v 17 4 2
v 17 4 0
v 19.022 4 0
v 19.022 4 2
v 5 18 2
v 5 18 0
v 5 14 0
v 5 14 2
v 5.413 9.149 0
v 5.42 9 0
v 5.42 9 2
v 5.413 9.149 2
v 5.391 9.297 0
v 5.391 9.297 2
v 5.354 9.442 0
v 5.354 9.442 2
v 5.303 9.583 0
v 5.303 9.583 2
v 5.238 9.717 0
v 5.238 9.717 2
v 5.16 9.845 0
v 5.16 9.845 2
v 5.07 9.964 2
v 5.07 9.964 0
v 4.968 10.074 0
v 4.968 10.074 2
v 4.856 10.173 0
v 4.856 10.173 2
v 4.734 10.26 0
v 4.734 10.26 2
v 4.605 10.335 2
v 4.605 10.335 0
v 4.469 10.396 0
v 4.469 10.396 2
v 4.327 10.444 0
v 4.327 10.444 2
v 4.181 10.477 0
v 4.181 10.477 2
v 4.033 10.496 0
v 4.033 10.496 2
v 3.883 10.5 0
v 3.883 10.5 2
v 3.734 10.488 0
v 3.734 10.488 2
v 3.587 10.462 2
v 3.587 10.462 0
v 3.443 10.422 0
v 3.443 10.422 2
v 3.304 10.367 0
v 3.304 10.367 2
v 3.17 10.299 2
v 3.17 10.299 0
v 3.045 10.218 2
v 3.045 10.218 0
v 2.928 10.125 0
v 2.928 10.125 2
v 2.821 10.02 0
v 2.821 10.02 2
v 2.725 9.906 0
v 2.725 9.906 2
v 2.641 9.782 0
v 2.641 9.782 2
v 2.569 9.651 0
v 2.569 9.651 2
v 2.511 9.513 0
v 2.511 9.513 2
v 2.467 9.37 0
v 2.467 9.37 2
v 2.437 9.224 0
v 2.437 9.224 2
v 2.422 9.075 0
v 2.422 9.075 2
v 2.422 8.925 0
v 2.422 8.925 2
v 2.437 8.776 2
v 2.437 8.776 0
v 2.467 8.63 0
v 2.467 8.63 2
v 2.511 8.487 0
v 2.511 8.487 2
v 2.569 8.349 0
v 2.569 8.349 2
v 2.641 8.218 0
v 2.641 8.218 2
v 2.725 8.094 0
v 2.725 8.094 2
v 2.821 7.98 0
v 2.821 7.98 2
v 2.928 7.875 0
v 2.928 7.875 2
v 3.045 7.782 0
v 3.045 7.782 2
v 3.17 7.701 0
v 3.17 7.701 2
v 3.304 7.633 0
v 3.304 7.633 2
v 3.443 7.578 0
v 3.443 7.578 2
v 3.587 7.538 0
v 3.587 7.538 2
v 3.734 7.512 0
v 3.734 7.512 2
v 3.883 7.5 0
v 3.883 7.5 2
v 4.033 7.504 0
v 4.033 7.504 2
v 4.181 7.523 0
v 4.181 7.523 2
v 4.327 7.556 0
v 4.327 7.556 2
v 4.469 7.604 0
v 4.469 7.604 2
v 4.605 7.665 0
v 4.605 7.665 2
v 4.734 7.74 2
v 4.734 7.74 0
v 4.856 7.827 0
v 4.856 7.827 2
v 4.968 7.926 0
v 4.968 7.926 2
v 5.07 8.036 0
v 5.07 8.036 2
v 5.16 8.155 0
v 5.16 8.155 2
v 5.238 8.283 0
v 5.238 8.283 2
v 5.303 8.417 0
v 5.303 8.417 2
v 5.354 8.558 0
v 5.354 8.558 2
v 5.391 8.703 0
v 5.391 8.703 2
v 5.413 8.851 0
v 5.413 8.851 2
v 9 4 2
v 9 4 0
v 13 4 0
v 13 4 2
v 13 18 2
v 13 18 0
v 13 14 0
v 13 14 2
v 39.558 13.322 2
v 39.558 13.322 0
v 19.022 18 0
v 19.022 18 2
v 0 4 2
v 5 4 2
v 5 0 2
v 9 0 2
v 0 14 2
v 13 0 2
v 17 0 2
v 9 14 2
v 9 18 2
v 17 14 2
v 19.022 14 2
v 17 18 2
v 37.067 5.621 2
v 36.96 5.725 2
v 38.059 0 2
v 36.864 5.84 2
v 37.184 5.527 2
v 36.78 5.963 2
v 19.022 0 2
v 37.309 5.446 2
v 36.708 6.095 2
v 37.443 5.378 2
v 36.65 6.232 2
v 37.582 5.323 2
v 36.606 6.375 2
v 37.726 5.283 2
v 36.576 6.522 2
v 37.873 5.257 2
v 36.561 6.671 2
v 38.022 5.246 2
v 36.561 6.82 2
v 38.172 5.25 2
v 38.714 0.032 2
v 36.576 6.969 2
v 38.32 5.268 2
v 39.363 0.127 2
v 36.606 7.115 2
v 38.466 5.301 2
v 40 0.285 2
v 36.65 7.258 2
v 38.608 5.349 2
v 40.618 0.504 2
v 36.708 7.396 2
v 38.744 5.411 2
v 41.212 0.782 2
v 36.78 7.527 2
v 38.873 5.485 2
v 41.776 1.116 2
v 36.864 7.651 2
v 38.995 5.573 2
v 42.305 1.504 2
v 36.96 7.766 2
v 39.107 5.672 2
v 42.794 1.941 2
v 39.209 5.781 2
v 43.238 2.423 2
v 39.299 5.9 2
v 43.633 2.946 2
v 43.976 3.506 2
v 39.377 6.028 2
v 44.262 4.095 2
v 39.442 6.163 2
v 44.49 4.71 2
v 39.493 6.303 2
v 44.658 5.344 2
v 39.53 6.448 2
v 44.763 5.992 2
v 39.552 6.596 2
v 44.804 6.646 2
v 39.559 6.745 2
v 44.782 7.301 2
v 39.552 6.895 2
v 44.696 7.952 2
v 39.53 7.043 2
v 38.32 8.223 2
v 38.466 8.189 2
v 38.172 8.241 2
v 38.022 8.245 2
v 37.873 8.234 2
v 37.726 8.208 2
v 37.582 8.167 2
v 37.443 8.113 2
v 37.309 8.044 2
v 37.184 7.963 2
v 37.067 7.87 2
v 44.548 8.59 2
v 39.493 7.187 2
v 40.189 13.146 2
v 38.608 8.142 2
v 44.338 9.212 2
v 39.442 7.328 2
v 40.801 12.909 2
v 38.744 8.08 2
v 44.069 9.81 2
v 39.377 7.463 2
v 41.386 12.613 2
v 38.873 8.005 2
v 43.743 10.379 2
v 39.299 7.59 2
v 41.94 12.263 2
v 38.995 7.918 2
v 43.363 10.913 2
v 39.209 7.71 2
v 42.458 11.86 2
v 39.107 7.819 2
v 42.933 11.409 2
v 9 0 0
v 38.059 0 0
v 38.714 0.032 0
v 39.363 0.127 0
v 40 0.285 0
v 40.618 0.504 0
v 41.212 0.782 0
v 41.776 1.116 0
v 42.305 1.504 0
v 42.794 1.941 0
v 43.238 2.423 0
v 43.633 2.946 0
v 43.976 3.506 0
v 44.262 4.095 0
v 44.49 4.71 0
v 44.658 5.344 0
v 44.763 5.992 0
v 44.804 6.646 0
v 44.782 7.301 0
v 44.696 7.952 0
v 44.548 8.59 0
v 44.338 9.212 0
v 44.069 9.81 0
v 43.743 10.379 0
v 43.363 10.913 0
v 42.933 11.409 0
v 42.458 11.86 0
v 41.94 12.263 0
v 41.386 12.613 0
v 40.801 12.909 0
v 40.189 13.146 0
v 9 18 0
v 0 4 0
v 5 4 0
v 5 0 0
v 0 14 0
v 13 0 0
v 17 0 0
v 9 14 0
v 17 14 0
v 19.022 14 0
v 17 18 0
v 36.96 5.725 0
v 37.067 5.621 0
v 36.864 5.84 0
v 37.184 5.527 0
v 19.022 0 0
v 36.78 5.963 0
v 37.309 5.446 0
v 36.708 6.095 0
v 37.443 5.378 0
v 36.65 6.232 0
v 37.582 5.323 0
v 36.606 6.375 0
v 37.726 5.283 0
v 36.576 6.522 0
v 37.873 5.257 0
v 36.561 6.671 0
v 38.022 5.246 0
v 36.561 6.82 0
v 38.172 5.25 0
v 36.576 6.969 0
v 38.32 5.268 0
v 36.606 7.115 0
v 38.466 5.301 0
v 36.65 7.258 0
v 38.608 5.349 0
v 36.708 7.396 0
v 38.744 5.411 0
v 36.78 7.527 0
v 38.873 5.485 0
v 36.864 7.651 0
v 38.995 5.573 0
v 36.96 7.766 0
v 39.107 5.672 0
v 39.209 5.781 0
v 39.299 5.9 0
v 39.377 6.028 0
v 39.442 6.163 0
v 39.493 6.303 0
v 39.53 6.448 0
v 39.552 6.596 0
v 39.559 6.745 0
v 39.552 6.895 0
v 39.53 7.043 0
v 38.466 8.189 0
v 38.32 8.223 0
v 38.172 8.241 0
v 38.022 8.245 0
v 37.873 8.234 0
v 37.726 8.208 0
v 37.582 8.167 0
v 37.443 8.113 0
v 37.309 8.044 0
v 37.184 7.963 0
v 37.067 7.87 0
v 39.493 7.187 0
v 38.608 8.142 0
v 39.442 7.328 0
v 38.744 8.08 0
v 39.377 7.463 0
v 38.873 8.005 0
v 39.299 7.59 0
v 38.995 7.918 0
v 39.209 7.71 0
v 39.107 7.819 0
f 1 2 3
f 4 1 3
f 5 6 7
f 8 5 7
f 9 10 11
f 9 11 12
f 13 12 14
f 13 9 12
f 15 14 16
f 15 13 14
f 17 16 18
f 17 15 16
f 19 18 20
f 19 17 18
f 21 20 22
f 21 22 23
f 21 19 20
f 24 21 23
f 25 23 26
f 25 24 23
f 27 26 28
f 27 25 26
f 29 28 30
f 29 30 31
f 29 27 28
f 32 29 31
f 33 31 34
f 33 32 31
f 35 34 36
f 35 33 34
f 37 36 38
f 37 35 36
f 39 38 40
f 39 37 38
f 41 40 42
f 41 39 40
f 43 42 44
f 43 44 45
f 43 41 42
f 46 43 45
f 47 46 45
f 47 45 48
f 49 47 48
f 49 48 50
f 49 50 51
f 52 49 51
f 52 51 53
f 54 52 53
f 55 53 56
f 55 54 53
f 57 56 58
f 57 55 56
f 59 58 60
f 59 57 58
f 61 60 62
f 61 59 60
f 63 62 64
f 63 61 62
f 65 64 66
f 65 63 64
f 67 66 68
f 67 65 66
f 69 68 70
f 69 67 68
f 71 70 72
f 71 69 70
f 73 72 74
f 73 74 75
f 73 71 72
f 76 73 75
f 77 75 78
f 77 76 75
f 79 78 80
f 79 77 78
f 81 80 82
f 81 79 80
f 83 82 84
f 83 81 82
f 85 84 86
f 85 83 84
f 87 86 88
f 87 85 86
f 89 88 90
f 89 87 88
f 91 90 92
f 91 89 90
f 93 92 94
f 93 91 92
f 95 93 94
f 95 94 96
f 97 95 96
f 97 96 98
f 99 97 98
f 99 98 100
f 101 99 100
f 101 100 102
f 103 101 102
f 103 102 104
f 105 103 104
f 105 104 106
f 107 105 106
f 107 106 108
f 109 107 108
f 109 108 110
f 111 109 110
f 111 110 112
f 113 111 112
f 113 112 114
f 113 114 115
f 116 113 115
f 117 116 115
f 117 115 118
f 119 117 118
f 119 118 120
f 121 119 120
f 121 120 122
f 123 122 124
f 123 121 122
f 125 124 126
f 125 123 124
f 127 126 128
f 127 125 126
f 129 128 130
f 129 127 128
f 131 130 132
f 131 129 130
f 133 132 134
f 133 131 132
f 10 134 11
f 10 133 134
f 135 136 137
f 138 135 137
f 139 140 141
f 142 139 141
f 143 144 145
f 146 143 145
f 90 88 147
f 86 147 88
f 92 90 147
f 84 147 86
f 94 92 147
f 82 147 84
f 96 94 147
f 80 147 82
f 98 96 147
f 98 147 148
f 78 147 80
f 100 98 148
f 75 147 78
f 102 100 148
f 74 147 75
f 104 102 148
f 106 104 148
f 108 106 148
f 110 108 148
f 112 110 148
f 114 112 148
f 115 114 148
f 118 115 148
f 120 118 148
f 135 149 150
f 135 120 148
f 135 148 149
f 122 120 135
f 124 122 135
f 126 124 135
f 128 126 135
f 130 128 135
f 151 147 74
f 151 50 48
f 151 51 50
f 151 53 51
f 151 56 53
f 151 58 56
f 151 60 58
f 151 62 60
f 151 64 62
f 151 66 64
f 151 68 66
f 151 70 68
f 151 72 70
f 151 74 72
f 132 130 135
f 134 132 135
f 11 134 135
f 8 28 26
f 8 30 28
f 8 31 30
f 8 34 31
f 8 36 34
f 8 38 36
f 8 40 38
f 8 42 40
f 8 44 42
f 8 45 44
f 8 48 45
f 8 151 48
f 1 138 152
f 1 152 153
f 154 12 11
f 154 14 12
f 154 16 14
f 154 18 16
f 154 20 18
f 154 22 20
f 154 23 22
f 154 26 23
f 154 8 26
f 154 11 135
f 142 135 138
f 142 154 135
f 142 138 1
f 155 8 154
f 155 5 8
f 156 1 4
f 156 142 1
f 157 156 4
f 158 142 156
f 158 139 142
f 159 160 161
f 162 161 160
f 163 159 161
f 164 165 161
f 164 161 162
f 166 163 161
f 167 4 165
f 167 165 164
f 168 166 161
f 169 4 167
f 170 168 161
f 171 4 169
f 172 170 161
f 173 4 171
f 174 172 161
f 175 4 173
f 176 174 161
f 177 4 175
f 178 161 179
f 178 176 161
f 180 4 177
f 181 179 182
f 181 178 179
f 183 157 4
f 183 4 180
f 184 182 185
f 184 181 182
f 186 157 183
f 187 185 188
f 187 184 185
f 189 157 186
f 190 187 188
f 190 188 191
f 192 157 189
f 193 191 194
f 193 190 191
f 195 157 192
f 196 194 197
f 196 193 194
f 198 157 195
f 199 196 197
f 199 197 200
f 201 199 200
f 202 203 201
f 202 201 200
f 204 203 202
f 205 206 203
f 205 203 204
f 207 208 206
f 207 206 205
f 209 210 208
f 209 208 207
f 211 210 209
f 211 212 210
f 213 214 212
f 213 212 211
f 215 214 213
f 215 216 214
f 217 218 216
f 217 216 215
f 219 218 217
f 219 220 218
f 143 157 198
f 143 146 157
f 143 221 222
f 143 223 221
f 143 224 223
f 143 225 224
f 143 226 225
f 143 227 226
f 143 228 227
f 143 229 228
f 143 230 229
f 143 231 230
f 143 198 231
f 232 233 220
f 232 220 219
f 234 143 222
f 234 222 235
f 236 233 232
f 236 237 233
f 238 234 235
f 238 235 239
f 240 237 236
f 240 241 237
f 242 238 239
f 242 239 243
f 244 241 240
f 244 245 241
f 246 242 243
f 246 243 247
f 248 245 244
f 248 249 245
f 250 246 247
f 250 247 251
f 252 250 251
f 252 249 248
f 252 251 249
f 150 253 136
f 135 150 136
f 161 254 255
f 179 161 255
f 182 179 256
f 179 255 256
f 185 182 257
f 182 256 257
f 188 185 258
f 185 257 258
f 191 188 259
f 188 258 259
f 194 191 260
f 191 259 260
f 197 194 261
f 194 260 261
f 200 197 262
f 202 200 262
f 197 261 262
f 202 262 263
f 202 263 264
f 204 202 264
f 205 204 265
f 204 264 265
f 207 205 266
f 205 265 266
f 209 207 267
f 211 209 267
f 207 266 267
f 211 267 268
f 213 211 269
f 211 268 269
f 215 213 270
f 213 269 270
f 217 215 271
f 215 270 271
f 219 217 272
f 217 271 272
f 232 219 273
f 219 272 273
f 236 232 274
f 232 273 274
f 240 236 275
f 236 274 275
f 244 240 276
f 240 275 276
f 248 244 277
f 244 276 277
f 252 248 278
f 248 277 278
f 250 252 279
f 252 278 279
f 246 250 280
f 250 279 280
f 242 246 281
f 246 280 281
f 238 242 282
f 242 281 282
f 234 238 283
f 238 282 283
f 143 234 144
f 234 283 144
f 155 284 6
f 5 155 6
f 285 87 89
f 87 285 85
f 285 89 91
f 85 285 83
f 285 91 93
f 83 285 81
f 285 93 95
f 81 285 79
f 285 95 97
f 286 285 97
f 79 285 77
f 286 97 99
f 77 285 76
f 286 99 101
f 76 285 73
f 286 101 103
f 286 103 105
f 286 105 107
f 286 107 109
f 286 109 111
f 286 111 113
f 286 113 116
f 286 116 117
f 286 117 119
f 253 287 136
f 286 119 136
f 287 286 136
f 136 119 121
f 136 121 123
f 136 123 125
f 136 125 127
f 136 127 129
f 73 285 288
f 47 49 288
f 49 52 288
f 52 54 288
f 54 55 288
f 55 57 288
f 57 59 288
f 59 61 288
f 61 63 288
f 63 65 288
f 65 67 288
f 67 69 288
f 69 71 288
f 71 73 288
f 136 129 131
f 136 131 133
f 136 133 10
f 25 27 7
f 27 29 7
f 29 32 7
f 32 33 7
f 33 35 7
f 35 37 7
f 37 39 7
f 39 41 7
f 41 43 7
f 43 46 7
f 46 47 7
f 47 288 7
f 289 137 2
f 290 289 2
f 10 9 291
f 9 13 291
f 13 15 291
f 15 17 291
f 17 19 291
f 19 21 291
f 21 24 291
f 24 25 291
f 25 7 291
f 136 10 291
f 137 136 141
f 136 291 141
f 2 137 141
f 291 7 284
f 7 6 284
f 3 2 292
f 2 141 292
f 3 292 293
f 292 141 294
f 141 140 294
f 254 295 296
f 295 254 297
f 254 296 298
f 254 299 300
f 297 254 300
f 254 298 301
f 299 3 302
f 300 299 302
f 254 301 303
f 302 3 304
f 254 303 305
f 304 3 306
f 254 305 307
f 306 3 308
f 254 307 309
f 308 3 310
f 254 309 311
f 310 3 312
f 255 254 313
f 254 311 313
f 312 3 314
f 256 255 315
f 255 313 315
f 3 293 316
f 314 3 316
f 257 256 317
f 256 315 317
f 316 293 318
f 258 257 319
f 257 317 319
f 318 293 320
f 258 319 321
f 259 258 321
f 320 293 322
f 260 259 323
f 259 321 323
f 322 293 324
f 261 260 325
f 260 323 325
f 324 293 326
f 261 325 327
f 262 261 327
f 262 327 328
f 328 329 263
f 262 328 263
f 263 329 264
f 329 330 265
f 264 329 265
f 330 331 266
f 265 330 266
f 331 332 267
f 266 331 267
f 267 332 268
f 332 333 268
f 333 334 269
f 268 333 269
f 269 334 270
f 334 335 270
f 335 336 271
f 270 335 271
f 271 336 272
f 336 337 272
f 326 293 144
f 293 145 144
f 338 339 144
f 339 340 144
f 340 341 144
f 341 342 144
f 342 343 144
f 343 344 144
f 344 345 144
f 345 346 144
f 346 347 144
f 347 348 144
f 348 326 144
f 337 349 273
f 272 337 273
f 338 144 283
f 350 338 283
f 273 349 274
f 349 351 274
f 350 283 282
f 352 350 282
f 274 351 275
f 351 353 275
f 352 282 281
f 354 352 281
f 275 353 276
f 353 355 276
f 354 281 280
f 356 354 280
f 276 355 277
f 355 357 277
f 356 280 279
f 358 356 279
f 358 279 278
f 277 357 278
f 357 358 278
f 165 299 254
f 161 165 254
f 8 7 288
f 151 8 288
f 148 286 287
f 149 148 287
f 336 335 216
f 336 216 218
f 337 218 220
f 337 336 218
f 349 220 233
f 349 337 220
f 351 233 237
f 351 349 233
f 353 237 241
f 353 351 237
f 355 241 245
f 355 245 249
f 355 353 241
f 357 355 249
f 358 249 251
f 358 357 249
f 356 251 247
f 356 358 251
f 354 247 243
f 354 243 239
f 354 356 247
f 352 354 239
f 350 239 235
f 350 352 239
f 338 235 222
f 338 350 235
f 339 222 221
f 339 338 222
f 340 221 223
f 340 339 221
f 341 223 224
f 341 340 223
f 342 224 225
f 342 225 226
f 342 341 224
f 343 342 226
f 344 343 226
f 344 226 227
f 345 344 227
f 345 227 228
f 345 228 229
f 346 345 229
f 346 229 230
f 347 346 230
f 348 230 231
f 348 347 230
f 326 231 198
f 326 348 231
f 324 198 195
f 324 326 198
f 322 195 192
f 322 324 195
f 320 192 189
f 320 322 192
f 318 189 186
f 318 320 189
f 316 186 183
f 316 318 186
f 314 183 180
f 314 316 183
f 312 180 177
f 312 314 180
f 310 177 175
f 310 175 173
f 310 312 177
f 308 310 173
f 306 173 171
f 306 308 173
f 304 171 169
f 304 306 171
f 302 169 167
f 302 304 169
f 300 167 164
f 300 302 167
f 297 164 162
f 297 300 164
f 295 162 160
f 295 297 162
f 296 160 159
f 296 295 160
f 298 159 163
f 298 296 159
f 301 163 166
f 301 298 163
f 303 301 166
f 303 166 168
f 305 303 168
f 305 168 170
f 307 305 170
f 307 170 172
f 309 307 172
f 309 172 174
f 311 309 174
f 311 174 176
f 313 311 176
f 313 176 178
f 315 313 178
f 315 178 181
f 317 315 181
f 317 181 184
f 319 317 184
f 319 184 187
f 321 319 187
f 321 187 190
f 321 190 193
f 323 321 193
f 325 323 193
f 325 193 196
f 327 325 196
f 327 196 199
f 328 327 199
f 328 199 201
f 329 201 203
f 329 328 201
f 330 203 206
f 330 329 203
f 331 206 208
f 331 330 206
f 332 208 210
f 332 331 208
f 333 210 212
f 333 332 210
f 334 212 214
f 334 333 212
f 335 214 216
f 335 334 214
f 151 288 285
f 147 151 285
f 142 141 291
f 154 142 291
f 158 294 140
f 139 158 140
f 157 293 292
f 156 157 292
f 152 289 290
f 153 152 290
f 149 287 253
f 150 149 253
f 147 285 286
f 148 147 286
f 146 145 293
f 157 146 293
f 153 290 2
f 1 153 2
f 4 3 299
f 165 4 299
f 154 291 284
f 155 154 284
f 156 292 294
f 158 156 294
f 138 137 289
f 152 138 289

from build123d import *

# Parameters (mm, degrees)
SKETCH1_R           = 1.5
BOSS_EXTRUDE1_DEPTH = 2


with BuildPart() as part:
    # Sketch1 → Boss-Extrude1 (new body)
    with BuildSketch(Plane.XY):
        with BuildLine():
            Line((5, 0), (9, 0))
            Line((9, 0), (9, 4))
            Line((9, 4), (13, 4))
            Line((13, 4), (13, 0))
            Line((13, 0), (17, 0))
            Line((17, 0), (17, 4))
            Line((17, 4), (19.021561934, 4))
            Line((19.021561934, 4), (19.021561934, 0))
            Line((19.021561934, 0), (38.059495851, 0))
            ThreePointArc((38.059495851, 0), (44.762590659, 5.991570372), (39.557599026, 13.322222296))
            Line((39.557599026, 13.322222296), (19.021561934, 17.999988357))
            Line((19.021561934, 17.999988357), (19.021561934, 13.999988357))
            Line((19.021561934, 13.999988357), (17, 13.999988357))
            Line((17, 13.999988357), (17, 17.999988357))
            Line((17, 17.999988357), (13, 17.999988357))
            Line((13, 17.999988357), (13, 13.999988357))
            Line((13, 13.999988357), (9, 13.999988357))
            Line((9, 13.999988357), (9, 17.999988357))
            Line((9, 17.999988357), (5, 17.999988357))
            Line((5, 17.999988357), (5, 13.999988357))
            Line((5, 13.999988357), (0, 13.999988357))
            Line((0, 13.999988357), (0, 4))
            Line((0, 4), (5, 4))
            Line((5, 4), (5, 0))
        make_face()
        with Locations((3.920490093, 9)):
            Circle(SKETCH1_R, mode=Mode.SUBTRACT)
        with Locations((38.059495851, 6.745343083)):
            Circle(SKETCH1_R, mode=Mode.SUBTRACT)
    extrude(amount=BOSS_EXTRUDE1_DEPTH)


solid = part.part
